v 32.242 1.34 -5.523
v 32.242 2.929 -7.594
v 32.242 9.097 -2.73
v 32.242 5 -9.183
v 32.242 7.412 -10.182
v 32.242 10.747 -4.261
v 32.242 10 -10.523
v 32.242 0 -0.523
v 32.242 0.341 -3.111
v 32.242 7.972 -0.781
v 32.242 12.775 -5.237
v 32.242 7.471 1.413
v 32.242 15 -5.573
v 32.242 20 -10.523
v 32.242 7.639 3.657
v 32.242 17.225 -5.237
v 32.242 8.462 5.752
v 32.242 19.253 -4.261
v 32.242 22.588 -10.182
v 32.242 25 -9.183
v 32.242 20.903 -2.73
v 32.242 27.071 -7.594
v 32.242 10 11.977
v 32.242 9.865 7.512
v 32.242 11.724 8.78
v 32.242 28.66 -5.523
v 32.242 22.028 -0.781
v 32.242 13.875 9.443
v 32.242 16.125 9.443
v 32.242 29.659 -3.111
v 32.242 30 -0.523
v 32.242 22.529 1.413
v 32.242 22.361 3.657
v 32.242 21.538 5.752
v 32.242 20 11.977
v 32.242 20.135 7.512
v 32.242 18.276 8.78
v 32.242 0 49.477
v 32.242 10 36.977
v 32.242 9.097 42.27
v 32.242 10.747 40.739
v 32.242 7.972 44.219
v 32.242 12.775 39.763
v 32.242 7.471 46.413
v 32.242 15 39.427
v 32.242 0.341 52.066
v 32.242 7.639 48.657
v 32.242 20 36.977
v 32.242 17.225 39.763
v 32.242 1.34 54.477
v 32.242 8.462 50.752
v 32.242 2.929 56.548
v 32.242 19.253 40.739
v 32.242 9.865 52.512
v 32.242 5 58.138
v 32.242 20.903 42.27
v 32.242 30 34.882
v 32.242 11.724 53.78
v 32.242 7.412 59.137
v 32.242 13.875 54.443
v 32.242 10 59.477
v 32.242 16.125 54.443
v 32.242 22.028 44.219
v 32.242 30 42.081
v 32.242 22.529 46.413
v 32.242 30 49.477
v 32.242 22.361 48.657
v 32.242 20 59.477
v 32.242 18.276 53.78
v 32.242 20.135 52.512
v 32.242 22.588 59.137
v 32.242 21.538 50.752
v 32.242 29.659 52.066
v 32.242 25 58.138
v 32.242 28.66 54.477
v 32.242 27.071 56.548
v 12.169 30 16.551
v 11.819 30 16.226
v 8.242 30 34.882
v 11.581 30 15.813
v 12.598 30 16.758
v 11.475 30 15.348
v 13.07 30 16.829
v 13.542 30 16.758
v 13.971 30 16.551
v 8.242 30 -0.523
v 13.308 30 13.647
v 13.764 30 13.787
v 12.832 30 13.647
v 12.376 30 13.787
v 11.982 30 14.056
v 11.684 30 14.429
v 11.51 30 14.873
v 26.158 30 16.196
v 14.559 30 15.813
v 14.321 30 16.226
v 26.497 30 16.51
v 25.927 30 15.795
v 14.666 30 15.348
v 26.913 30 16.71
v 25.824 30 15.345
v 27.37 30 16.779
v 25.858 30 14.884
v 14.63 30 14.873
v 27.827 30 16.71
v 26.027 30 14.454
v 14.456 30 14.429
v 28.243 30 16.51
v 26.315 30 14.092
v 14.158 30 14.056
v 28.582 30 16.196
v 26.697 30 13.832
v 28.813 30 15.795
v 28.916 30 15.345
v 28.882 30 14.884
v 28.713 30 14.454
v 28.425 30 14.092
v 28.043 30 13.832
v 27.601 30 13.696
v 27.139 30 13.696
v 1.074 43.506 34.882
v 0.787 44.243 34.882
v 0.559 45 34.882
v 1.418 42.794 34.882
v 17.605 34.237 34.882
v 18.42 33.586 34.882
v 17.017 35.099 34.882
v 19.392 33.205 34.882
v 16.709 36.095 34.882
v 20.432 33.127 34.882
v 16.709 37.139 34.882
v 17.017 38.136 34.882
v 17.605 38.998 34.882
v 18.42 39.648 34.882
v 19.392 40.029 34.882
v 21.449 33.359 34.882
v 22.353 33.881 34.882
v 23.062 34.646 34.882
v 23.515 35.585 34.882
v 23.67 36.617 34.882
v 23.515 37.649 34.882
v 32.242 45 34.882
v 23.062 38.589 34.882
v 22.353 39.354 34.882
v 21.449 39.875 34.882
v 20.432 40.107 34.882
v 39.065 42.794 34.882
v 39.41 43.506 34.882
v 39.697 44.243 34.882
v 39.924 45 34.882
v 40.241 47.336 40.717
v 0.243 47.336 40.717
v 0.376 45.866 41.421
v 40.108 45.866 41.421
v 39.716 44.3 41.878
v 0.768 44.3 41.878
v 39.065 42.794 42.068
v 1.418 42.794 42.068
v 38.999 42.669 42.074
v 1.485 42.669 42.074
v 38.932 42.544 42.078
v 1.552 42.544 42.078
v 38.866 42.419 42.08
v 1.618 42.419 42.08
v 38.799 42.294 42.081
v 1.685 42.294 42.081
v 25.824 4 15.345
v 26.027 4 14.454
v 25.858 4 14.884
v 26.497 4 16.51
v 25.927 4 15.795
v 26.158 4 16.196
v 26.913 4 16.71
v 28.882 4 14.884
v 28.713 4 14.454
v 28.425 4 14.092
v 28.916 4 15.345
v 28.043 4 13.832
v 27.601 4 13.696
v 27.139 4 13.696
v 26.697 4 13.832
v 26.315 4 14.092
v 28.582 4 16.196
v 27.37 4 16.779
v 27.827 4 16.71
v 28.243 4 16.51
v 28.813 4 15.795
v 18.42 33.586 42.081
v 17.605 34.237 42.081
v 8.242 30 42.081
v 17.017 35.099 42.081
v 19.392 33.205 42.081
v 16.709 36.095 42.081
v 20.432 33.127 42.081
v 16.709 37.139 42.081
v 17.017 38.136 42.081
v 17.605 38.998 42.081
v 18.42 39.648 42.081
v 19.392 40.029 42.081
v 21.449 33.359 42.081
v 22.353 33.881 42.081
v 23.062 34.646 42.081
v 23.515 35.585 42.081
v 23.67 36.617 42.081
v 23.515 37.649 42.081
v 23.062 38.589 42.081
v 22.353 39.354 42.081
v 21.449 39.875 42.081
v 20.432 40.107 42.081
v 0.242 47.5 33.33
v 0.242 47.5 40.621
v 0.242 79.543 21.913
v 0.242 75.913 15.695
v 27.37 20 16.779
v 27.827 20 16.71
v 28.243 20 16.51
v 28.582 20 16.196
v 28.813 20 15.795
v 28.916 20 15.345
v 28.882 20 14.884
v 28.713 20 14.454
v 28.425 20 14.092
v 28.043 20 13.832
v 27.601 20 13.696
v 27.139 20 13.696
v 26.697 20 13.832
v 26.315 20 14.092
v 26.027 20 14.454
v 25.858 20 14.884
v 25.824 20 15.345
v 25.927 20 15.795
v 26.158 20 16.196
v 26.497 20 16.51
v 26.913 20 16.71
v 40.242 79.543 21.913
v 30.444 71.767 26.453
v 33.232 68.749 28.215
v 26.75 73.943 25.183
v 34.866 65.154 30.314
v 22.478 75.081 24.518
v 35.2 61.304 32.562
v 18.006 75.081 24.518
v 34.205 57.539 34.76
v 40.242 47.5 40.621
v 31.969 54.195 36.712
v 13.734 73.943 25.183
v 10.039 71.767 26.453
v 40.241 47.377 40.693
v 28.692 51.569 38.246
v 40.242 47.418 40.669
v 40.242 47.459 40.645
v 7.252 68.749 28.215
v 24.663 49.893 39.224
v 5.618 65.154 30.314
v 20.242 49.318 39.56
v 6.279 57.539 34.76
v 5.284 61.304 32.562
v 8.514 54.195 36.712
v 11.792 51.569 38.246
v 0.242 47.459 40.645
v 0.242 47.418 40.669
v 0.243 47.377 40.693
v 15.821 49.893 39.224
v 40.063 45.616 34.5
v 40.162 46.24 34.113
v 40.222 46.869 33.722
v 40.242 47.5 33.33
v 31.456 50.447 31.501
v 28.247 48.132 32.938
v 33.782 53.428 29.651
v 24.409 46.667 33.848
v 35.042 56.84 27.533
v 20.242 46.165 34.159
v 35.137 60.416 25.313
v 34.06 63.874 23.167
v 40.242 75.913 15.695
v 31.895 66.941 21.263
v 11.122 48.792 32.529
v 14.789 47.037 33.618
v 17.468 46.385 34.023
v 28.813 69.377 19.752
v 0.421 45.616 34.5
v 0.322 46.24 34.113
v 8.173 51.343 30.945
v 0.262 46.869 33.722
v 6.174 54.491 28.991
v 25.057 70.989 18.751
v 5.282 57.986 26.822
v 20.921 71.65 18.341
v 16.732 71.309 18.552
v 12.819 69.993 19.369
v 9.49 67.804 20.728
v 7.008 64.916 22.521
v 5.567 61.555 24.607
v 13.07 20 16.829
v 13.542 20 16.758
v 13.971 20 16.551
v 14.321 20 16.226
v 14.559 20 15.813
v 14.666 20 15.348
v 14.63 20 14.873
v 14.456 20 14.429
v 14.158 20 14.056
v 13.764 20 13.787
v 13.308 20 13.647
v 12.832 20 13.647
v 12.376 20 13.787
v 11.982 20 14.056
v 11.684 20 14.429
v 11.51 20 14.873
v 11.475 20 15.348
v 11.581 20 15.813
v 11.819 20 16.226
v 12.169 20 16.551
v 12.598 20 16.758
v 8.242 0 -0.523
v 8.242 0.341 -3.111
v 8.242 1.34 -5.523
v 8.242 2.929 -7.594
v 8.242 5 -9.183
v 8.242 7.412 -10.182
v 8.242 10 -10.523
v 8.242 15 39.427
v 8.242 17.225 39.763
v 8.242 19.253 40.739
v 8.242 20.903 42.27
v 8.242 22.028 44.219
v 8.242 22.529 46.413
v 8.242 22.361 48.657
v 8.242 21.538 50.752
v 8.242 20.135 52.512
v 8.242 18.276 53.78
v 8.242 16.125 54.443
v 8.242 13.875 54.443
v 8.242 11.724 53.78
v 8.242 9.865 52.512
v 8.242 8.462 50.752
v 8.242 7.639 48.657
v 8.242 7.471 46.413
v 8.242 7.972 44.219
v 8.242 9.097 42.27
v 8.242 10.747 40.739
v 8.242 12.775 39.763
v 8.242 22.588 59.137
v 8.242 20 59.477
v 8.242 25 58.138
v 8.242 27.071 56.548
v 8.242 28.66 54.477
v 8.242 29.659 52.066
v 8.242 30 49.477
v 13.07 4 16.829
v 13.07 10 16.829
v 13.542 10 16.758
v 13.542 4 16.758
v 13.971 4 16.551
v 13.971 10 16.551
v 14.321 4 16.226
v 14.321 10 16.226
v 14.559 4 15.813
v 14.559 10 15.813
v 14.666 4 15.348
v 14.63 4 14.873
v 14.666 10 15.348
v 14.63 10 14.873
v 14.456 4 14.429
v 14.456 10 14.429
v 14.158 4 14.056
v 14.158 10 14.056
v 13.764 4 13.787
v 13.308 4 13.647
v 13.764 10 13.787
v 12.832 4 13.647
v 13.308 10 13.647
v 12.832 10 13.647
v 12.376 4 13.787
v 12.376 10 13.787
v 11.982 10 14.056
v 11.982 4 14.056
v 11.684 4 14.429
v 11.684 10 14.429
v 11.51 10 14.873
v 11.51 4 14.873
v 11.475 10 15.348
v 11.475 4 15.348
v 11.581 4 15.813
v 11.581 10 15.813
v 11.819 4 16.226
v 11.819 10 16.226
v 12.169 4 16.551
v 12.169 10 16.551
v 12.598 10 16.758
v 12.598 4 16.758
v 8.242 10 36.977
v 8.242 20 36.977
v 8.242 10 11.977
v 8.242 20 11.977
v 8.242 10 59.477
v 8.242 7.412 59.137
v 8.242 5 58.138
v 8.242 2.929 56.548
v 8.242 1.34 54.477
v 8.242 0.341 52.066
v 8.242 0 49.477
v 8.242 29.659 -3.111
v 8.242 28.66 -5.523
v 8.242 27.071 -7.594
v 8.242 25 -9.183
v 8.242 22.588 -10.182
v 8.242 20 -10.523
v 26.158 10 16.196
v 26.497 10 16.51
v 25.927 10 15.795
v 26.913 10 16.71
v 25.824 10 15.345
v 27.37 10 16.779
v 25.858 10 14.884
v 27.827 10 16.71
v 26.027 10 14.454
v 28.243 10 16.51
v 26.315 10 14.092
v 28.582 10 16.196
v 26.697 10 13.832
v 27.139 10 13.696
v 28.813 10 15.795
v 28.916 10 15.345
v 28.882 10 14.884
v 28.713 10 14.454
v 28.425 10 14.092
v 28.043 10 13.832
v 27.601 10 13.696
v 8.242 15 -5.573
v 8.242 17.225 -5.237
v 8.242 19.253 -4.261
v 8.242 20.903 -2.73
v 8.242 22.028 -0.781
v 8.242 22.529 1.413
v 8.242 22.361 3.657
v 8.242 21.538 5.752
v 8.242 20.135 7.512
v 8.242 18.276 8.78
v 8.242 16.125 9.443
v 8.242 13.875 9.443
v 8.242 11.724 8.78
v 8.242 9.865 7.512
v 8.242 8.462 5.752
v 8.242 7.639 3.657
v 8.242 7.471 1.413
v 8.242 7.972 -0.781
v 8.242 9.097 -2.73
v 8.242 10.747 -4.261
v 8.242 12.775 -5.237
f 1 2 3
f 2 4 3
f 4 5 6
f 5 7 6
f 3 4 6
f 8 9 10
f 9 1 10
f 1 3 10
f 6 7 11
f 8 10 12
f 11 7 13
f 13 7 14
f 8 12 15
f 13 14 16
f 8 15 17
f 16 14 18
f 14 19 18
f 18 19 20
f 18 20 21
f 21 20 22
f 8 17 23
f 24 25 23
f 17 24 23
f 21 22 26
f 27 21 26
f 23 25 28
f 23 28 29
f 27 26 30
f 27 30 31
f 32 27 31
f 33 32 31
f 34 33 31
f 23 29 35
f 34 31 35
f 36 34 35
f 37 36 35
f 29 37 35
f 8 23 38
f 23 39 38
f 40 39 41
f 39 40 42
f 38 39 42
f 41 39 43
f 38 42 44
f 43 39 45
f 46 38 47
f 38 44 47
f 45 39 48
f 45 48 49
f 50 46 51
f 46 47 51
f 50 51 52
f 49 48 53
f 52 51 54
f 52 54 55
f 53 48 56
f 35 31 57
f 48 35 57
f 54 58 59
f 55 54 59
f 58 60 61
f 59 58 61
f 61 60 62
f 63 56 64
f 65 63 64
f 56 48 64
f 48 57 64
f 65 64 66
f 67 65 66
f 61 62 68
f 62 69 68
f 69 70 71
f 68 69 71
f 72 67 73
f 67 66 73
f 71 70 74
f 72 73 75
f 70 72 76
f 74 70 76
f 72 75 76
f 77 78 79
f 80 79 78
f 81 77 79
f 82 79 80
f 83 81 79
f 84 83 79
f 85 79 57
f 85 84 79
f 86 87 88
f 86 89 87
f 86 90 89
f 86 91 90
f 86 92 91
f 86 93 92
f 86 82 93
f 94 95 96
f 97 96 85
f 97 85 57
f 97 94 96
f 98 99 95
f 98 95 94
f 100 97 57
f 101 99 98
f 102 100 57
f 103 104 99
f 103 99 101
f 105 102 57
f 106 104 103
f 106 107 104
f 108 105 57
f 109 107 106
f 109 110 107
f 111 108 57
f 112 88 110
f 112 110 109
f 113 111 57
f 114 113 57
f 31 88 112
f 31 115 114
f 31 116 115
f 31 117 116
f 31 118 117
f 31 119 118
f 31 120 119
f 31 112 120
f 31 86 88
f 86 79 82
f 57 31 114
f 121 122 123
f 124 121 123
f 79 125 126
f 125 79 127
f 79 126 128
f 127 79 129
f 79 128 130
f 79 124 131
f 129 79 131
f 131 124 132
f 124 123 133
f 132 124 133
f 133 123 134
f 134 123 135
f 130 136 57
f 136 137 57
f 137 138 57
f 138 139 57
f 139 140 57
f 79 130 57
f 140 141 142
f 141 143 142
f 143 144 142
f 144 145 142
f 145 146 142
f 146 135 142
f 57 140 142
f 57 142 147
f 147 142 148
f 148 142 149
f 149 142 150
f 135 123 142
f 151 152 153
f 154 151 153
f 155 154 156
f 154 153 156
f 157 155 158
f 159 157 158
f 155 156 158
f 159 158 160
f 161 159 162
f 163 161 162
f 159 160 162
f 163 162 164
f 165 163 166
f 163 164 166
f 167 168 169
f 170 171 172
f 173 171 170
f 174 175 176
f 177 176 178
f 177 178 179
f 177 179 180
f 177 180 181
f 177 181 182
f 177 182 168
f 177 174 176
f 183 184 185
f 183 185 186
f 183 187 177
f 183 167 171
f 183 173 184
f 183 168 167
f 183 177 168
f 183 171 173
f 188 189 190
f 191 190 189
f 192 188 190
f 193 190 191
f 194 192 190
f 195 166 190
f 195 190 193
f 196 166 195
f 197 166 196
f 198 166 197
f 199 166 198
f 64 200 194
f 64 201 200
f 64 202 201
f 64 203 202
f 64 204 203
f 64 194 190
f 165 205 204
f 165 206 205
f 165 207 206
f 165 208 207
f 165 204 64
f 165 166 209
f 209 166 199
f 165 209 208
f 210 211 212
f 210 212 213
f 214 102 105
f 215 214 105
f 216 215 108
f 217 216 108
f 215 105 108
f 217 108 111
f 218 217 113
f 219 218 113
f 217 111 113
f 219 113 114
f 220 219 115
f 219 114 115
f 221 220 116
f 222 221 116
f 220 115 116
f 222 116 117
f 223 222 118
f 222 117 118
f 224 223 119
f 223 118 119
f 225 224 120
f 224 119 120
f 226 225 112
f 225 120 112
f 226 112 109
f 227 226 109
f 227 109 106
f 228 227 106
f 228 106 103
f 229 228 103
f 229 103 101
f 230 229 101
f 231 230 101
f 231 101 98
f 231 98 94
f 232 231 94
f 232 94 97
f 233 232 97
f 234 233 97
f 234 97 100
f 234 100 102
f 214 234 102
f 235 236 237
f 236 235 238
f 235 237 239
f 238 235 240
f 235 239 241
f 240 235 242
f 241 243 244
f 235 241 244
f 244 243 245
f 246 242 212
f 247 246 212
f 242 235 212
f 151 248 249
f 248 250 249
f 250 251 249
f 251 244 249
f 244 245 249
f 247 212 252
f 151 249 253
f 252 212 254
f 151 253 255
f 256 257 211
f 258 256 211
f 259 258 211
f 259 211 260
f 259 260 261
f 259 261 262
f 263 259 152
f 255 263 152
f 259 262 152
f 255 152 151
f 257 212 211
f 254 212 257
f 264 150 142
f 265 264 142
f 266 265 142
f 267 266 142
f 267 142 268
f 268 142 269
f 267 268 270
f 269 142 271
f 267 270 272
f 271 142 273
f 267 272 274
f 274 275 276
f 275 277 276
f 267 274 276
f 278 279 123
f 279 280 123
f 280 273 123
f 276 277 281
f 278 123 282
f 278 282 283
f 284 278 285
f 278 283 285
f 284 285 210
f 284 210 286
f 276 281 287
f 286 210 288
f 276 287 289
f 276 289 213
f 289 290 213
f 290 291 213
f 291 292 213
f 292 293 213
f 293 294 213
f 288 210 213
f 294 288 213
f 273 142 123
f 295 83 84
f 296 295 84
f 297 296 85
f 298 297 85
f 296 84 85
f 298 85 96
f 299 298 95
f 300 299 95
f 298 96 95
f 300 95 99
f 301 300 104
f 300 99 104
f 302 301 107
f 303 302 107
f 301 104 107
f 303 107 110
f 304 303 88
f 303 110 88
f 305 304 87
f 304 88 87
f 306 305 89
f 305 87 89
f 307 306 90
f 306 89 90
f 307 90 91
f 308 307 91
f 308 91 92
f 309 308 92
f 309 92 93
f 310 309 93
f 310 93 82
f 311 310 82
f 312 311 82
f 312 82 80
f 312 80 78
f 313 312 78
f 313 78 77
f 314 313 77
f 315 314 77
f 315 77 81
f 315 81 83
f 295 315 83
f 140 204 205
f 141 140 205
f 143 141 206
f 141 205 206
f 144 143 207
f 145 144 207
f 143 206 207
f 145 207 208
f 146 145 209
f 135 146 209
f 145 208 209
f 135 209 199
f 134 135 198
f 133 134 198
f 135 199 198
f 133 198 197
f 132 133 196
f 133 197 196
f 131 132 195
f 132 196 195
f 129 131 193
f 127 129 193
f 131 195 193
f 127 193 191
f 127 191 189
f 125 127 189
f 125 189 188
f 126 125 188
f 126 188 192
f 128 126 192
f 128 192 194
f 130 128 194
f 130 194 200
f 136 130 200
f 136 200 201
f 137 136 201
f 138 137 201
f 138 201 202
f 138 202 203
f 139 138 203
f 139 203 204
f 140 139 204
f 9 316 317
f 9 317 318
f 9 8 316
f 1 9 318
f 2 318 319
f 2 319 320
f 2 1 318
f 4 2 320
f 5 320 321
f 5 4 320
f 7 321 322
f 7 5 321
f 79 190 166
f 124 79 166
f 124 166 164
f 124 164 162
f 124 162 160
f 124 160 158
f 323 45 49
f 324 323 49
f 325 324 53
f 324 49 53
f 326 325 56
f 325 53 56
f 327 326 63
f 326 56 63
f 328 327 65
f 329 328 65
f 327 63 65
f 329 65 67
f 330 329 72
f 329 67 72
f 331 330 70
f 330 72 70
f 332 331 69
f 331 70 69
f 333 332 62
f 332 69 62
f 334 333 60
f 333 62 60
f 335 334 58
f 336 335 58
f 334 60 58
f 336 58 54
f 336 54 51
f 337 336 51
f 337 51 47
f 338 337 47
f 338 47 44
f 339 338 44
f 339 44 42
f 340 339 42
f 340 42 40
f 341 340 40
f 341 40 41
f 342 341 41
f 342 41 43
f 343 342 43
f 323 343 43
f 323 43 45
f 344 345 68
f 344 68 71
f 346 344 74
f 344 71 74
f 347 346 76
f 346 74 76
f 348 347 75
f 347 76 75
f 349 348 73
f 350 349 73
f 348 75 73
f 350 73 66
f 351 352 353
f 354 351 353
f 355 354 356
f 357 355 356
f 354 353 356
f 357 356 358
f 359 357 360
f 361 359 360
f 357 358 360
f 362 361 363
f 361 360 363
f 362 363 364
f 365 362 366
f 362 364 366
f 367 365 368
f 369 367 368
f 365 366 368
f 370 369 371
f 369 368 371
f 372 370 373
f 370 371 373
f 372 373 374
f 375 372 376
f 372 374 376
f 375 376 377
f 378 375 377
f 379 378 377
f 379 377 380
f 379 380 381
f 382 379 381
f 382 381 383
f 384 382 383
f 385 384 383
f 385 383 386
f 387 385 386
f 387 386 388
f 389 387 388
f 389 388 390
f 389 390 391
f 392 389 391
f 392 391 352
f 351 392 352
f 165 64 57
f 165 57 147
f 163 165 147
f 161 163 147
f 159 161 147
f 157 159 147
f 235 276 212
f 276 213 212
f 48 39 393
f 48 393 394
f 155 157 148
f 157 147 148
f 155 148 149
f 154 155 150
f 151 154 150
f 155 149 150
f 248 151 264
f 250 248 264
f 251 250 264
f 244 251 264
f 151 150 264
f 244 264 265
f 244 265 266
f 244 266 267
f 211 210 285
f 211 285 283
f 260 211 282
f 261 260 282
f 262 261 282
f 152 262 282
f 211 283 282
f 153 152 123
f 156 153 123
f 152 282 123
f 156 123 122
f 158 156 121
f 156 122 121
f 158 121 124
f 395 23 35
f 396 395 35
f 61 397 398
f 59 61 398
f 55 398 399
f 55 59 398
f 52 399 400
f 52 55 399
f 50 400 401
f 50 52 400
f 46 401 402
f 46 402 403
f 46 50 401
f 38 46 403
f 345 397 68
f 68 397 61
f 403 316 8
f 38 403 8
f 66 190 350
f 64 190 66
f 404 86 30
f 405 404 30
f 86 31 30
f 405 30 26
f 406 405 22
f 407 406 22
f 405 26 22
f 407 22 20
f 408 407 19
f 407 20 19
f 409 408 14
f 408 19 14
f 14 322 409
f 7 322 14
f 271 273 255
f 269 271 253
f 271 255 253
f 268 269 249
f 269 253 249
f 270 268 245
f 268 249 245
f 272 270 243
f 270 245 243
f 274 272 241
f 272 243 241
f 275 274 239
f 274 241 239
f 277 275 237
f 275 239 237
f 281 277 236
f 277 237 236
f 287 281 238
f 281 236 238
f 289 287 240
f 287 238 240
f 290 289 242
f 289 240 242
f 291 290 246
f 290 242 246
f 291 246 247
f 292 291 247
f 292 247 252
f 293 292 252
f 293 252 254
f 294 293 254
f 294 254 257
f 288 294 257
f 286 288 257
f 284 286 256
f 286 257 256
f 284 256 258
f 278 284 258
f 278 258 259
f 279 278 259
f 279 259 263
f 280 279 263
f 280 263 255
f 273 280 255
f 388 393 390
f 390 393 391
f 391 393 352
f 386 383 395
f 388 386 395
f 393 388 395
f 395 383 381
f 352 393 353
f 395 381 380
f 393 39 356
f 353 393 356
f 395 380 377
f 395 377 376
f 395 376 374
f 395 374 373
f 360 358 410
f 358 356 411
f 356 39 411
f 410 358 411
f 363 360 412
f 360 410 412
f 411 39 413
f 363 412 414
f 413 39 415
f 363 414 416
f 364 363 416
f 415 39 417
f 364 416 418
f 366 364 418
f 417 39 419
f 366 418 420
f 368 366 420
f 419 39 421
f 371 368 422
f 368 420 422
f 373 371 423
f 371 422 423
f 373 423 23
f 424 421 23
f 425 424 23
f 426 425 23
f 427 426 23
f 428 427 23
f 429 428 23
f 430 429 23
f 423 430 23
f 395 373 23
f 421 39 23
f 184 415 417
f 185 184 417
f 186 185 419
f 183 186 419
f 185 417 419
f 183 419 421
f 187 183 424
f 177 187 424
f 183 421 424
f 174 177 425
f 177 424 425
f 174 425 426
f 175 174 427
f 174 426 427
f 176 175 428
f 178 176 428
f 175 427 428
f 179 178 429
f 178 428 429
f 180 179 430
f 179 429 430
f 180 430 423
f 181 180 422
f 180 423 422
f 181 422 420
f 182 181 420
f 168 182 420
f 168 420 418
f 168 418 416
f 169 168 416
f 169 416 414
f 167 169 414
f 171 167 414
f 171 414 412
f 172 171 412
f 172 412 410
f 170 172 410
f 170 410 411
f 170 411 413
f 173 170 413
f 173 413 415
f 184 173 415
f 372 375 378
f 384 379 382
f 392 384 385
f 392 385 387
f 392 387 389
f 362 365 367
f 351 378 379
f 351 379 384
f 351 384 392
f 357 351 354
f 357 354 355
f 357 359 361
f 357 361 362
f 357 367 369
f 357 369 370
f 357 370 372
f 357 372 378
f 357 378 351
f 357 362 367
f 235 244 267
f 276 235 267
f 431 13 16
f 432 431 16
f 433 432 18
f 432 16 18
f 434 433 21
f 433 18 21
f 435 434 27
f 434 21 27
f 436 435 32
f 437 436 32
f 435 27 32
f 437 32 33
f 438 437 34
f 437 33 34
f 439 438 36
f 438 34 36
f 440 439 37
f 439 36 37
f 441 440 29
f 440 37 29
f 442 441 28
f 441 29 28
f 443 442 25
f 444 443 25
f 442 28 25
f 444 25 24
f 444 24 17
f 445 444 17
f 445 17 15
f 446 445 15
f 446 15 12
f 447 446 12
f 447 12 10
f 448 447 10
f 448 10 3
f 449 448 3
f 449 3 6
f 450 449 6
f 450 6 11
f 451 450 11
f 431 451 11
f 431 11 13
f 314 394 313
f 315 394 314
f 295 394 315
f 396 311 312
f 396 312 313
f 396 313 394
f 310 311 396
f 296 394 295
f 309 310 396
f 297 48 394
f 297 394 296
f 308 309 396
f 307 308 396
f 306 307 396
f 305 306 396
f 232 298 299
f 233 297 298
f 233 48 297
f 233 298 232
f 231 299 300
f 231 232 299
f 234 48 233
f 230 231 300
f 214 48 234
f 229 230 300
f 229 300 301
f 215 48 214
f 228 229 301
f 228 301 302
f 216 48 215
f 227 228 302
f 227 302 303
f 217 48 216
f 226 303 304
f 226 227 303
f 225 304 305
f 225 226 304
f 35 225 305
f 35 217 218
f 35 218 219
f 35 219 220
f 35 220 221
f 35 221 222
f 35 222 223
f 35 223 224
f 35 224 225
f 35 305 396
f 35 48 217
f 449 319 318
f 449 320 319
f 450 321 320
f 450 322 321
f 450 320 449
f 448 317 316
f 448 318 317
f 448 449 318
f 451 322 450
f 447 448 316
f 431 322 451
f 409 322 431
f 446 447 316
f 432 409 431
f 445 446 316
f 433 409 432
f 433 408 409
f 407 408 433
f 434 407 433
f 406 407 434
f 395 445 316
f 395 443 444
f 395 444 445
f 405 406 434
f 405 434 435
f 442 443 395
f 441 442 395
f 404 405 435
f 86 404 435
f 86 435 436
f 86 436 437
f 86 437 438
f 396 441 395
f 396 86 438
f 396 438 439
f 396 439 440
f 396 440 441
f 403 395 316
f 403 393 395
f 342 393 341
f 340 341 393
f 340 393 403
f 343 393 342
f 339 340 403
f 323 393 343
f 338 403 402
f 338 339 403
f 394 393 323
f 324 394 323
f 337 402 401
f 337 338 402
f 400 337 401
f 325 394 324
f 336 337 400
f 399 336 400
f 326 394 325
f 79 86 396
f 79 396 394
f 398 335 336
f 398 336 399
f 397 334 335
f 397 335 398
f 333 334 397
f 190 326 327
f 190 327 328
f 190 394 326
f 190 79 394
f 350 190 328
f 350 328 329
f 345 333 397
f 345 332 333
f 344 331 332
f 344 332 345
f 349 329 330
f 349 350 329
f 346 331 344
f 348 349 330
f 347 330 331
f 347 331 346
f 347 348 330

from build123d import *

# Parameters (mm, degrees)
SKETCH_1_W          = 24
SKETCH_1_H          = 70
EXTRUDE_1_DEPTH     = 30
SKETCH_2_R          = 7.55
CUT_EXTRUDE_1_DEPTH = 71.806439045
SKETCH_3_W          = 25
SKETCH_3_H          = 10
CUT_EXTRUDE_2_DEPTH = 71.806439045
FILLET_1_R          = 10
SKETCH_6_W          = 24
SKETCH_6_H          = 7.198600856
EXTRUDE_3_DEPTH     = 15
EXTRUDE_4_DEPTH     = 24
EXTRUDE_5_DEPTH     = 8
EXTRUDE_6_DEPTH     = 8
SKETCH_10_R         = 15
CUT_EXTRUDE_4_DEPTH = 16
EXTRUDE_7_DEPTH     = 7.198600855
EXTRUDE_8_DEPTH     = 7.198600855
FILLET_2_R          = 10
FILLET_3_R          = 10
SKETCH_14_R         = 3.499999999
CUT_EXTRUDE_5_DEPTH = 13
SKETCH_16_R         = 1.599999999
SKETCH_16_R_2       = 1.550452657
CUT_EXTRUDE_6_DEPTH = 26


with BuildPart() as part:
    # 草图1 → 凸台-拉伸1 (new body)
    with BuildSketch(Plane(origin=(0, 0, 0), x_dir=(1, 0, 0), z_dir=(0, 1, 0))):
        with Locations((20.241900648, -24.477321814)):
            Rectangle(SKETCH_1_W, SKETCH_1_H)
    extrude(amount=EXTRUDE_1_DEPTH)

    # 草图2 → 切除-拉伸1 (cut, through all)
    with BuildSketch(Plane(origin=(32.241900648, 0, 0), x_dir=(0, 0, -1), z_dir=(1, 0, 0))):
        with Locations((-46.977321814, 15)):
            Circle(SKETCH_2_R)
        with Locations((-1.977321814, 15)):
            Circle(SKETCH_2_R)
    extrude(amount=-CUT_EXTRUDE_1_DEPTH, mode=Mode.SUBTRACT)

    # 草图3 → 切除-拉伸2 (cut, through all)
    with BuildSketch(Plane(origin=(32.241900648, 0, 0), x_dir=(0, 0, -1), z_dir=(1, 0, 0))):
        with Locations((-24.477321814, 15)):
            Rectangle(SKETCH_3_W, SKETCH_3_H)
    extrude(amount=-CUT_EXTRUDE_2_DEPTH, mode=Mode.SUBTRACT)

    # 圆角1
    fillet_1_edges = [part.edges().sort_by_distance(p)[0] for p in [
        (20.241900648, 30, -10.522678186),
        (20.241900648, 0, -10.522678186),
        (20.241900648, 0, 59.477321814),
        (20.241900648, 30, 59.477321814),
    ]]
    fillet(fillet_1_edges, radius=FILLET_1_R)

    # 草图6 → 凸台-拉伸3 (add)
    with BuildSketch(Plane(origin=(0, 30, 0), x_dir=(1, 0, 0), z_dir=(0, 1, 0))):
        with Locations((20.241900648, -38.481509693)):
            Rectangle(SKETCH_6_W, SKETCH_6_H)
    extrude(amount=EXTRUDE_3_DEPTH)

    # 草图7 → 凸台-拉伸4 (add)
    with BuildSketch(Plane.ZY.offset(-8.241900648)):
        Polygon((42.080810121, 45), (21.912574503, 79.54333904), (15.694773475, 75.913056629), (34.882209265, 45), align=None)
    extrude(amount=-EXTRUDE_4_DEPTH)

    # 草图8 → 凸台-拉伸5 (add)
    with BuildSketch(Plane.ZY.offset(-8.241900648)):
        Polygon((42.080810121, 45), (34.882209265, 45), (15.694773475, 75.913056629), (21.912574503, 79.54333904), align=None)
    extrude(amount=EXTRUDE_5_DEPTH)

    # 草图9 → 凸台-拉伸6 (add)
    with BuildSketch(Plane(origin=(32.241900648, 0, 0), x_dir=(0, 0, -1), z_dir=(1, 0, 0))):
        Polygon((-42.080810121, 45), (-34.882209265, 45), (-15.694773475, 75.913056629), (-21.912574503, 79.54333904), align=None)
    extrude(amount=EXTRUDE_6_DEPTH)

    # 草图10 → 切除-拉伸4 (cut)
    with BuildSketch(Plane(origin=(0, 29.763050525, 50.976950321), x_dir=(1, 0, 0), z_dir=(0, 0.5042058904481267, 0.8635834760099408))):
        with Locations(Location((20.241900648, 37.643864083, 0), (0, 0, 270))):
            Circle(SKETCH_10_R)
    extrude(amount=-CUT_EXTRUDE_4_DEPTH, mode=Mode.SUBTRACT)

    # 草图12 → 凸台-拉伸7 (add)
    with BuildSketch(Plane.XY.offset(42.080810121)):
        Polygon((0.241900648, 45), (8.241900648, 45), (8.241900648, 30), align=None)
    extrude(amount=-EXTRUDE_7_DEPTH)

    # 草图13 → 凸台-拉伸8 (add)
    with BuildSketch(Plane.XY.offset(42.080810121)):
        Polygon((40.241900648, 45), (32.241900648, 45), (32.241900648, 30), align=None)
    extrude(amount=-EXTRUDE_8_DEPTH)

    # 圆角2
    fillet_2_edges = [part.edges().sort_by_distance(p)[0] for p in [
        (20.241900648, 45, 42.080810121),
    ]]
    fillet(fillet_2_edges, radius=FILLET_2_R)

    # 圆角3
    fillet_3_edges = [part.edges().sort_by_distance(p)[0] for p in [
        (0.241900648, 45, 38.295029227),
        (40.241900648, 45, 38.295029227),
    ]]
    fillet(fillet_3_edges, radius=FILLET_3_R)

    # 草图14 → 切除-拉伸5 (cut)
    with BuildSketch(Plane.XY.offset(42.080810121)):
        with Locations((20.170389916, 36.617139635)):
            Circle(SKETCH_14_R)
    extrude(amount=-CUT_EXTRUDE_5_DEPTH, mode=Mode.SUBTRACT)

    # 草图16 → 切除-拉伸6 (cut)
    with BuildSketch(Plane(origin=(0, 30, 0), x_dir=(1, 0, 0), z_dir=(0, 1, 0))):
        with Locations(Location((13.070026875, -15.228876714, 0), (0, 0, 270))):
            Circle(SKETCH_16_R)
        with Locations(Location((27.370026875, -15.228876714, 0), (0, 0, 270))):
            Circle(SKETCH_16_R_2)
    extrude(amount=-CUT_EXTRUDE_6_DEPTH, mode=Mode.SUBTRACT)


solid = part.part
